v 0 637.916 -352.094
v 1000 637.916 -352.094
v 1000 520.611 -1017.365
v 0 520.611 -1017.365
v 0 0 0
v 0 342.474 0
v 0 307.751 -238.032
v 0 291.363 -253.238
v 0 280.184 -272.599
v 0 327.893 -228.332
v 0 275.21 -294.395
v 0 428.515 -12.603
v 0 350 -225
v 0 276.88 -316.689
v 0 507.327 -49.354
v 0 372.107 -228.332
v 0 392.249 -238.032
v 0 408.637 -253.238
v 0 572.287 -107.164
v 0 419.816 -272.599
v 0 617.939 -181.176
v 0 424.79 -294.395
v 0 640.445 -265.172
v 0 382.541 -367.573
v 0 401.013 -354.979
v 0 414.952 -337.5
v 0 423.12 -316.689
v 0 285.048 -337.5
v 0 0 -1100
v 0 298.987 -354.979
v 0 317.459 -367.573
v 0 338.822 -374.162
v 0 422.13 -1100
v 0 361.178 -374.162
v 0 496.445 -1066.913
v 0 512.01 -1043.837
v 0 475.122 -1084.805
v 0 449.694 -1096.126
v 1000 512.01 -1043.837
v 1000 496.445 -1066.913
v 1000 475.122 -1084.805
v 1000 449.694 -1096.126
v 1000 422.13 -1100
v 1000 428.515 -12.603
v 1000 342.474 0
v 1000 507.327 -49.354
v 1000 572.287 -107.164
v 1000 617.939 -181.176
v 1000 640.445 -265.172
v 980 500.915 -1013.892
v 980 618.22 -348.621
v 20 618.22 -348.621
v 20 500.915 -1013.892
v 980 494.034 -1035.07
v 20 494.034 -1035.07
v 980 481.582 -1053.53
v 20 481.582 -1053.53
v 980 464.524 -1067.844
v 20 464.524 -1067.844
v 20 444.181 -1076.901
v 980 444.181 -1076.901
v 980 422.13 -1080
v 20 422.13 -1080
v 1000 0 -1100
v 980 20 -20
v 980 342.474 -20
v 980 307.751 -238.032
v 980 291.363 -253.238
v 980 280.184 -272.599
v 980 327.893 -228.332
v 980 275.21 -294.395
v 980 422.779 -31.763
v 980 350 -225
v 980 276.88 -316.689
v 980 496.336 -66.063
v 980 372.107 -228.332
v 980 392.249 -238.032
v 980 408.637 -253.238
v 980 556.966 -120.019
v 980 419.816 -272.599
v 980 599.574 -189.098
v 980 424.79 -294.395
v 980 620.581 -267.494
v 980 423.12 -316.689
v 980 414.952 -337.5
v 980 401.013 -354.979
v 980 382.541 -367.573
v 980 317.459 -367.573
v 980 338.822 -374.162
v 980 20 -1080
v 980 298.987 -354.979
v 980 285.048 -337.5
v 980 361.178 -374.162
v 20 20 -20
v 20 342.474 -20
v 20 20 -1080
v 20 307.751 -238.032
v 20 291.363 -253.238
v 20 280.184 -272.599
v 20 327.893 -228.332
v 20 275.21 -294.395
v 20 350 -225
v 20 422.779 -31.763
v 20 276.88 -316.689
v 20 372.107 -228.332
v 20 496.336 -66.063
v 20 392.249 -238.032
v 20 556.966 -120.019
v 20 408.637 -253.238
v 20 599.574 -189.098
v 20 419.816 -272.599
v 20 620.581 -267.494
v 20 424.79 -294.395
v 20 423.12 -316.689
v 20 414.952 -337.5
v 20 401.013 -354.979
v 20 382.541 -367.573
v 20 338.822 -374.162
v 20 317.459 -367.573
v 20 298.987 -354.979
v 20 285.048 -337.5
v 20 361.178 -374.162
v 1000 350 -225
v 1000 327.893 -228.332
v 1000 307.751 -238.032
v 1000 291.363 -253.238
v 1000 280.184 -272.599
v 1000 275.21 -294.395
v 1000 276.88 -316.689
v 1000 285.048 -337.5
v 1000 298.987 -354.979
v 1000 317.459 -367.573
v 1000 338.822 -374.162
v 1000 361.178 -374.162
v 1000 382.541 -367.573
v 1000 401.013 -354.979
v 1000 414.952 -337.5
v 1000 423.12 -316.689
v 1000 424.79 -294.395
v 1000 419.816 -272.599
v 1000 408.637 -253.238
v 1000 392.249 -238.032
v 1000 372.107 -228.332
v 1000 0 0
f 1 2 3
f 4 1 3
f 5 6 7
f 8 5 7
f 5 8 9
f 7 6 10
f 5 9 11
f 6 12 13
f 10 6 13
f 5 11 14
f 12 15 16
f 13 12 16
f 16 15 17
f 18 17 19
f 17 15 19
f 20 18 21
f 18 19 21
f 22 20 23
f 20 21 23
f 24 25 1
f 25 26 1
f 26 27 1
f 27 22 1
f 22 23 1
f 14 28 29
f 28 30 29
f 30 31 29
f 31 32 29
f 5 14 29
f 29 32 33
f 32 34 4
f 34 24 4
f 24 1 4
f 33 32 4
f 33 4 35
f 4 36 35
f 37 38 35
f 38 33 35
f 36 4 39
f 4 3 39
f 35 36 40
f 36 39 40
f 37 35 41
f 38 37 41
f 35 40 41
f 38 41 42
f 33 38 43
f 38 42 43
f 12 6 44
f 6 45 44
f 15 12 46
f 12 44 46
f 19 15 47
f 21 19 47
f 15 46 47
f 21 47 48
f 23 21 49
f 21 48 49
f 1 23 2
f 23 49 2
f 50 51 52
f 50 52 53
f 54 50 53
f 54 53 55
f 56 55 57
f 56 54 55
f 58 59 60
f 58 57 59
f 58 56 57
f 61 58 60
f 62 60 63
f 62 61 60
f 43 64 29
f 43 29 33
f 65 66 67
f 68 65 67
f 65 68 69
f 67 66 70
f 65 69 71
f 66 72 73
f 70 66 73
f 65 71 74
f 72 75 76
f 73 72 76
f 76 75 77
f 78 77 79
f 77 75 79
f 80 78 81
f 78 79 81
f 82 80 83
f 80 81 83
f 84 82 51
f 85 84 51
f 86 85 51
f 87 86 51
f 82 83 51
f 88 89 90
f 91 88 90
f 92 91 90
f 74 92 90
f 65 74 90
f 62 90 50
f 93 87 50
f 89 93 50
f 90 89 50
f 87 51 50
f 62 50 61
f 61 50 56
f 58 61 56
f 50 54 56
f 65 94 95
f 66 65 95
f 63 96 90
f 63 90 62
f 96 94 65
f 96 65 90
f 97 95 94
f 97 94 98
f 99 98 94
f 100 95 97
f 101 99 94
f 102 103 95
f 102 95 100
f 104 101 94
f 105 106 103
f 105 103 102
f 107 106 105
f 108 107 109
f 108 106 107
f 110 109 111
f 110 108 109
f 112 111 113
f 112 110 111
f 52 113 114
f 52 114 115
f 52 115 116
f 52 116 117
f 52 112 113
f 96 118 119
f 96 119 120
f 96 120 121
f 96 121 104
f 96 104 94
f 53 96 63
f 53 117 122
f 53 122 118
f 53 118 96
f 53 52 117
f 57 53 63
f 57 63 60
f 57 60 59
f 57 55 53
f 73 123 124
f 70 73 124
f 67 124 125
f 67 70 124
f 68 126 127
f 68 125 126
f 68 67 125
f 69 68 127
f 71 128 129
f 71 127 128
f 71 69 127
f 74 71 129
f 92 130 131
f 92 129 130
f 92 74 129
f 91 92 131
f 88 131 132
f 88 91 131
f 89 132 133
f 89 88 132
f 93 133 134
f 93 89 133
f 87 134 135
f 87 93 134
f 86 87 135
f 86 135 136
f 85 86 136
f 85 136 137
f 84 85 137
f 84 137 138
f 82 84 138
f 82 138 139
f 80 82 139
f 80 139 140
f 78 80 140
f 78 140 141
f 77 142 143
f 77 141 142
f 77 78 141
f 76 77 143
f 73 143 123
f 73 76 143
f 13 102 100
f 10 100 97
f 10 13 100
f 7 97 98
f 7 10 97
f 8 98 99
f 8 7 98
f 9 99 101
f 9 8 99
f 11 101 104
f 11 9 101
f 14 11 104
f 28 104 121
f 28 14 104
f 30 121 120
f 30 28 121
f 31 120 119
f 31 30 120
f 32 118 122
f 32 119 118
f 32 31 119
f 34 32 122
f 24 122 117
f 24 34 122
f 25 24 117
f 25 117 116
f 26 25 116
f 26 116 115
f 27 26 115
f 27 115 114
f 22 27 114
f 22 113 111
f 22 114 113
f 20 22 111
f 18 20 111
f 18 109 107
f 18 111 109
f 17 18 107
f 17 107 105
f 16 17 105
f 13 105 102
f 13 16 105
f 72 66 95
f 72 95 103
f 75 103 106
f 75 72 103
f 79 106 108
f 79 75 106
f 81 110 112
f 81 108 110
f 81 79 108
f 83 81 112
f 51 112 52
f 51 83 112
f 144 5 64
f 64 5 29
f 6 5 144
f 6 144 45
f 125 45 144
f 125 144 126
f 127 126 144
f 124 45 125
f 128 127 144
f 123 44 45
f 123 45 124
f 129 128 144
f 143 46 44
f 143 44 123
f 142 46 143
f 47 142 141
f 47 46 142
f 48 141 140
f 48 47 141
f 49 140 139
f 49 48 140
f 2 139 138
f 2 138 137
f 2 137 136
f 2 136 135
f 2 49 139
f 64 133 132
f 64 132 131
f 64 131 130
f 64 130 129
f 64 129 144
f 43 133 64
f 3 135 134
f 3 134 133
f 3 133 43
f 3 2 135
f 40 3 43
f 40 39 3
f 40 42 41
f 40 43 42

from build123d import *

# Parameters (mm, degrees)
SKETCH_271_W          = 1100
SKETCH_271_H          = 700
EXTRUDE_334_DEPTH     = 1000
DRAFT_385_ANGLE       = -10
FILLET_1_R            = 300
FILLET_2_R            = 100
SHELL_626_T           = 20
SKETCH_649_R          = 75
CUT_EXTRUDE_760_DEPTH = 1620.497681608


with BuildPart() as part:
    # Sketch 271 → Extrude 334 (new body)
    with BuildSketch(Plane(origin=(0, 0, 0), x_dir=(0, 0, -1), z_dir=(1, 0, 0))):
        with Locations((550, 350)):
            Rectangle(SKETCH_271_W, SKETCH_271_H)
    extrude(amount=EXTRUDE_334_DEPTH)

    # Draft 385
    draft_385_faces = [part.faces().sort_by_distance(p)[0] for p in [
        (500, 700, -550),
    ]]
    draft(draft_385_faces, Plane(origin=(1000, 0, 0), x_dir=(1, 0, 0), z_dir=(0, 0, 1)), DRAFT_385_ANGLE)

    # Скруглення1
    fillet_1_edges = [part.edges().sort_by_distance(p)[0] for p in [
        (500, 700, 0),
    ]]
    fillet(fillet_1_edges, radius=FILLET_1_R)

    # Скруглення2
    fillet_2_edges = [part.edges().sort_by_distance(p)[0] for p in [
        (500, 506.040321221, -1100),
    ]]
    fillet(fillet_2_edges, radius=FILLET_2_R)

    # Shell 626 (no face opened: a closed hollow body)
    add(offset(amount=-SHELL_626_T, mode=Mode.PRIVATE), mode=Mode.SUBTRACT)

    # Sketch 649 → Cut-Extrude 760 (cut, through all)
    with BuildSketch(Plane(origin=(0, 0, 0), x_dir=(0, 0, -1), z_dir=(1, 0, 0))):
        with Locations(Location((300, 350, 0), (0, 0, 180))):
            Circle(SKETCH_649_R)
    extrude(amount=CUT_EXTRUDE_760_DEPTH, mode=Mode.SUBTRACT)


solid = part.part
